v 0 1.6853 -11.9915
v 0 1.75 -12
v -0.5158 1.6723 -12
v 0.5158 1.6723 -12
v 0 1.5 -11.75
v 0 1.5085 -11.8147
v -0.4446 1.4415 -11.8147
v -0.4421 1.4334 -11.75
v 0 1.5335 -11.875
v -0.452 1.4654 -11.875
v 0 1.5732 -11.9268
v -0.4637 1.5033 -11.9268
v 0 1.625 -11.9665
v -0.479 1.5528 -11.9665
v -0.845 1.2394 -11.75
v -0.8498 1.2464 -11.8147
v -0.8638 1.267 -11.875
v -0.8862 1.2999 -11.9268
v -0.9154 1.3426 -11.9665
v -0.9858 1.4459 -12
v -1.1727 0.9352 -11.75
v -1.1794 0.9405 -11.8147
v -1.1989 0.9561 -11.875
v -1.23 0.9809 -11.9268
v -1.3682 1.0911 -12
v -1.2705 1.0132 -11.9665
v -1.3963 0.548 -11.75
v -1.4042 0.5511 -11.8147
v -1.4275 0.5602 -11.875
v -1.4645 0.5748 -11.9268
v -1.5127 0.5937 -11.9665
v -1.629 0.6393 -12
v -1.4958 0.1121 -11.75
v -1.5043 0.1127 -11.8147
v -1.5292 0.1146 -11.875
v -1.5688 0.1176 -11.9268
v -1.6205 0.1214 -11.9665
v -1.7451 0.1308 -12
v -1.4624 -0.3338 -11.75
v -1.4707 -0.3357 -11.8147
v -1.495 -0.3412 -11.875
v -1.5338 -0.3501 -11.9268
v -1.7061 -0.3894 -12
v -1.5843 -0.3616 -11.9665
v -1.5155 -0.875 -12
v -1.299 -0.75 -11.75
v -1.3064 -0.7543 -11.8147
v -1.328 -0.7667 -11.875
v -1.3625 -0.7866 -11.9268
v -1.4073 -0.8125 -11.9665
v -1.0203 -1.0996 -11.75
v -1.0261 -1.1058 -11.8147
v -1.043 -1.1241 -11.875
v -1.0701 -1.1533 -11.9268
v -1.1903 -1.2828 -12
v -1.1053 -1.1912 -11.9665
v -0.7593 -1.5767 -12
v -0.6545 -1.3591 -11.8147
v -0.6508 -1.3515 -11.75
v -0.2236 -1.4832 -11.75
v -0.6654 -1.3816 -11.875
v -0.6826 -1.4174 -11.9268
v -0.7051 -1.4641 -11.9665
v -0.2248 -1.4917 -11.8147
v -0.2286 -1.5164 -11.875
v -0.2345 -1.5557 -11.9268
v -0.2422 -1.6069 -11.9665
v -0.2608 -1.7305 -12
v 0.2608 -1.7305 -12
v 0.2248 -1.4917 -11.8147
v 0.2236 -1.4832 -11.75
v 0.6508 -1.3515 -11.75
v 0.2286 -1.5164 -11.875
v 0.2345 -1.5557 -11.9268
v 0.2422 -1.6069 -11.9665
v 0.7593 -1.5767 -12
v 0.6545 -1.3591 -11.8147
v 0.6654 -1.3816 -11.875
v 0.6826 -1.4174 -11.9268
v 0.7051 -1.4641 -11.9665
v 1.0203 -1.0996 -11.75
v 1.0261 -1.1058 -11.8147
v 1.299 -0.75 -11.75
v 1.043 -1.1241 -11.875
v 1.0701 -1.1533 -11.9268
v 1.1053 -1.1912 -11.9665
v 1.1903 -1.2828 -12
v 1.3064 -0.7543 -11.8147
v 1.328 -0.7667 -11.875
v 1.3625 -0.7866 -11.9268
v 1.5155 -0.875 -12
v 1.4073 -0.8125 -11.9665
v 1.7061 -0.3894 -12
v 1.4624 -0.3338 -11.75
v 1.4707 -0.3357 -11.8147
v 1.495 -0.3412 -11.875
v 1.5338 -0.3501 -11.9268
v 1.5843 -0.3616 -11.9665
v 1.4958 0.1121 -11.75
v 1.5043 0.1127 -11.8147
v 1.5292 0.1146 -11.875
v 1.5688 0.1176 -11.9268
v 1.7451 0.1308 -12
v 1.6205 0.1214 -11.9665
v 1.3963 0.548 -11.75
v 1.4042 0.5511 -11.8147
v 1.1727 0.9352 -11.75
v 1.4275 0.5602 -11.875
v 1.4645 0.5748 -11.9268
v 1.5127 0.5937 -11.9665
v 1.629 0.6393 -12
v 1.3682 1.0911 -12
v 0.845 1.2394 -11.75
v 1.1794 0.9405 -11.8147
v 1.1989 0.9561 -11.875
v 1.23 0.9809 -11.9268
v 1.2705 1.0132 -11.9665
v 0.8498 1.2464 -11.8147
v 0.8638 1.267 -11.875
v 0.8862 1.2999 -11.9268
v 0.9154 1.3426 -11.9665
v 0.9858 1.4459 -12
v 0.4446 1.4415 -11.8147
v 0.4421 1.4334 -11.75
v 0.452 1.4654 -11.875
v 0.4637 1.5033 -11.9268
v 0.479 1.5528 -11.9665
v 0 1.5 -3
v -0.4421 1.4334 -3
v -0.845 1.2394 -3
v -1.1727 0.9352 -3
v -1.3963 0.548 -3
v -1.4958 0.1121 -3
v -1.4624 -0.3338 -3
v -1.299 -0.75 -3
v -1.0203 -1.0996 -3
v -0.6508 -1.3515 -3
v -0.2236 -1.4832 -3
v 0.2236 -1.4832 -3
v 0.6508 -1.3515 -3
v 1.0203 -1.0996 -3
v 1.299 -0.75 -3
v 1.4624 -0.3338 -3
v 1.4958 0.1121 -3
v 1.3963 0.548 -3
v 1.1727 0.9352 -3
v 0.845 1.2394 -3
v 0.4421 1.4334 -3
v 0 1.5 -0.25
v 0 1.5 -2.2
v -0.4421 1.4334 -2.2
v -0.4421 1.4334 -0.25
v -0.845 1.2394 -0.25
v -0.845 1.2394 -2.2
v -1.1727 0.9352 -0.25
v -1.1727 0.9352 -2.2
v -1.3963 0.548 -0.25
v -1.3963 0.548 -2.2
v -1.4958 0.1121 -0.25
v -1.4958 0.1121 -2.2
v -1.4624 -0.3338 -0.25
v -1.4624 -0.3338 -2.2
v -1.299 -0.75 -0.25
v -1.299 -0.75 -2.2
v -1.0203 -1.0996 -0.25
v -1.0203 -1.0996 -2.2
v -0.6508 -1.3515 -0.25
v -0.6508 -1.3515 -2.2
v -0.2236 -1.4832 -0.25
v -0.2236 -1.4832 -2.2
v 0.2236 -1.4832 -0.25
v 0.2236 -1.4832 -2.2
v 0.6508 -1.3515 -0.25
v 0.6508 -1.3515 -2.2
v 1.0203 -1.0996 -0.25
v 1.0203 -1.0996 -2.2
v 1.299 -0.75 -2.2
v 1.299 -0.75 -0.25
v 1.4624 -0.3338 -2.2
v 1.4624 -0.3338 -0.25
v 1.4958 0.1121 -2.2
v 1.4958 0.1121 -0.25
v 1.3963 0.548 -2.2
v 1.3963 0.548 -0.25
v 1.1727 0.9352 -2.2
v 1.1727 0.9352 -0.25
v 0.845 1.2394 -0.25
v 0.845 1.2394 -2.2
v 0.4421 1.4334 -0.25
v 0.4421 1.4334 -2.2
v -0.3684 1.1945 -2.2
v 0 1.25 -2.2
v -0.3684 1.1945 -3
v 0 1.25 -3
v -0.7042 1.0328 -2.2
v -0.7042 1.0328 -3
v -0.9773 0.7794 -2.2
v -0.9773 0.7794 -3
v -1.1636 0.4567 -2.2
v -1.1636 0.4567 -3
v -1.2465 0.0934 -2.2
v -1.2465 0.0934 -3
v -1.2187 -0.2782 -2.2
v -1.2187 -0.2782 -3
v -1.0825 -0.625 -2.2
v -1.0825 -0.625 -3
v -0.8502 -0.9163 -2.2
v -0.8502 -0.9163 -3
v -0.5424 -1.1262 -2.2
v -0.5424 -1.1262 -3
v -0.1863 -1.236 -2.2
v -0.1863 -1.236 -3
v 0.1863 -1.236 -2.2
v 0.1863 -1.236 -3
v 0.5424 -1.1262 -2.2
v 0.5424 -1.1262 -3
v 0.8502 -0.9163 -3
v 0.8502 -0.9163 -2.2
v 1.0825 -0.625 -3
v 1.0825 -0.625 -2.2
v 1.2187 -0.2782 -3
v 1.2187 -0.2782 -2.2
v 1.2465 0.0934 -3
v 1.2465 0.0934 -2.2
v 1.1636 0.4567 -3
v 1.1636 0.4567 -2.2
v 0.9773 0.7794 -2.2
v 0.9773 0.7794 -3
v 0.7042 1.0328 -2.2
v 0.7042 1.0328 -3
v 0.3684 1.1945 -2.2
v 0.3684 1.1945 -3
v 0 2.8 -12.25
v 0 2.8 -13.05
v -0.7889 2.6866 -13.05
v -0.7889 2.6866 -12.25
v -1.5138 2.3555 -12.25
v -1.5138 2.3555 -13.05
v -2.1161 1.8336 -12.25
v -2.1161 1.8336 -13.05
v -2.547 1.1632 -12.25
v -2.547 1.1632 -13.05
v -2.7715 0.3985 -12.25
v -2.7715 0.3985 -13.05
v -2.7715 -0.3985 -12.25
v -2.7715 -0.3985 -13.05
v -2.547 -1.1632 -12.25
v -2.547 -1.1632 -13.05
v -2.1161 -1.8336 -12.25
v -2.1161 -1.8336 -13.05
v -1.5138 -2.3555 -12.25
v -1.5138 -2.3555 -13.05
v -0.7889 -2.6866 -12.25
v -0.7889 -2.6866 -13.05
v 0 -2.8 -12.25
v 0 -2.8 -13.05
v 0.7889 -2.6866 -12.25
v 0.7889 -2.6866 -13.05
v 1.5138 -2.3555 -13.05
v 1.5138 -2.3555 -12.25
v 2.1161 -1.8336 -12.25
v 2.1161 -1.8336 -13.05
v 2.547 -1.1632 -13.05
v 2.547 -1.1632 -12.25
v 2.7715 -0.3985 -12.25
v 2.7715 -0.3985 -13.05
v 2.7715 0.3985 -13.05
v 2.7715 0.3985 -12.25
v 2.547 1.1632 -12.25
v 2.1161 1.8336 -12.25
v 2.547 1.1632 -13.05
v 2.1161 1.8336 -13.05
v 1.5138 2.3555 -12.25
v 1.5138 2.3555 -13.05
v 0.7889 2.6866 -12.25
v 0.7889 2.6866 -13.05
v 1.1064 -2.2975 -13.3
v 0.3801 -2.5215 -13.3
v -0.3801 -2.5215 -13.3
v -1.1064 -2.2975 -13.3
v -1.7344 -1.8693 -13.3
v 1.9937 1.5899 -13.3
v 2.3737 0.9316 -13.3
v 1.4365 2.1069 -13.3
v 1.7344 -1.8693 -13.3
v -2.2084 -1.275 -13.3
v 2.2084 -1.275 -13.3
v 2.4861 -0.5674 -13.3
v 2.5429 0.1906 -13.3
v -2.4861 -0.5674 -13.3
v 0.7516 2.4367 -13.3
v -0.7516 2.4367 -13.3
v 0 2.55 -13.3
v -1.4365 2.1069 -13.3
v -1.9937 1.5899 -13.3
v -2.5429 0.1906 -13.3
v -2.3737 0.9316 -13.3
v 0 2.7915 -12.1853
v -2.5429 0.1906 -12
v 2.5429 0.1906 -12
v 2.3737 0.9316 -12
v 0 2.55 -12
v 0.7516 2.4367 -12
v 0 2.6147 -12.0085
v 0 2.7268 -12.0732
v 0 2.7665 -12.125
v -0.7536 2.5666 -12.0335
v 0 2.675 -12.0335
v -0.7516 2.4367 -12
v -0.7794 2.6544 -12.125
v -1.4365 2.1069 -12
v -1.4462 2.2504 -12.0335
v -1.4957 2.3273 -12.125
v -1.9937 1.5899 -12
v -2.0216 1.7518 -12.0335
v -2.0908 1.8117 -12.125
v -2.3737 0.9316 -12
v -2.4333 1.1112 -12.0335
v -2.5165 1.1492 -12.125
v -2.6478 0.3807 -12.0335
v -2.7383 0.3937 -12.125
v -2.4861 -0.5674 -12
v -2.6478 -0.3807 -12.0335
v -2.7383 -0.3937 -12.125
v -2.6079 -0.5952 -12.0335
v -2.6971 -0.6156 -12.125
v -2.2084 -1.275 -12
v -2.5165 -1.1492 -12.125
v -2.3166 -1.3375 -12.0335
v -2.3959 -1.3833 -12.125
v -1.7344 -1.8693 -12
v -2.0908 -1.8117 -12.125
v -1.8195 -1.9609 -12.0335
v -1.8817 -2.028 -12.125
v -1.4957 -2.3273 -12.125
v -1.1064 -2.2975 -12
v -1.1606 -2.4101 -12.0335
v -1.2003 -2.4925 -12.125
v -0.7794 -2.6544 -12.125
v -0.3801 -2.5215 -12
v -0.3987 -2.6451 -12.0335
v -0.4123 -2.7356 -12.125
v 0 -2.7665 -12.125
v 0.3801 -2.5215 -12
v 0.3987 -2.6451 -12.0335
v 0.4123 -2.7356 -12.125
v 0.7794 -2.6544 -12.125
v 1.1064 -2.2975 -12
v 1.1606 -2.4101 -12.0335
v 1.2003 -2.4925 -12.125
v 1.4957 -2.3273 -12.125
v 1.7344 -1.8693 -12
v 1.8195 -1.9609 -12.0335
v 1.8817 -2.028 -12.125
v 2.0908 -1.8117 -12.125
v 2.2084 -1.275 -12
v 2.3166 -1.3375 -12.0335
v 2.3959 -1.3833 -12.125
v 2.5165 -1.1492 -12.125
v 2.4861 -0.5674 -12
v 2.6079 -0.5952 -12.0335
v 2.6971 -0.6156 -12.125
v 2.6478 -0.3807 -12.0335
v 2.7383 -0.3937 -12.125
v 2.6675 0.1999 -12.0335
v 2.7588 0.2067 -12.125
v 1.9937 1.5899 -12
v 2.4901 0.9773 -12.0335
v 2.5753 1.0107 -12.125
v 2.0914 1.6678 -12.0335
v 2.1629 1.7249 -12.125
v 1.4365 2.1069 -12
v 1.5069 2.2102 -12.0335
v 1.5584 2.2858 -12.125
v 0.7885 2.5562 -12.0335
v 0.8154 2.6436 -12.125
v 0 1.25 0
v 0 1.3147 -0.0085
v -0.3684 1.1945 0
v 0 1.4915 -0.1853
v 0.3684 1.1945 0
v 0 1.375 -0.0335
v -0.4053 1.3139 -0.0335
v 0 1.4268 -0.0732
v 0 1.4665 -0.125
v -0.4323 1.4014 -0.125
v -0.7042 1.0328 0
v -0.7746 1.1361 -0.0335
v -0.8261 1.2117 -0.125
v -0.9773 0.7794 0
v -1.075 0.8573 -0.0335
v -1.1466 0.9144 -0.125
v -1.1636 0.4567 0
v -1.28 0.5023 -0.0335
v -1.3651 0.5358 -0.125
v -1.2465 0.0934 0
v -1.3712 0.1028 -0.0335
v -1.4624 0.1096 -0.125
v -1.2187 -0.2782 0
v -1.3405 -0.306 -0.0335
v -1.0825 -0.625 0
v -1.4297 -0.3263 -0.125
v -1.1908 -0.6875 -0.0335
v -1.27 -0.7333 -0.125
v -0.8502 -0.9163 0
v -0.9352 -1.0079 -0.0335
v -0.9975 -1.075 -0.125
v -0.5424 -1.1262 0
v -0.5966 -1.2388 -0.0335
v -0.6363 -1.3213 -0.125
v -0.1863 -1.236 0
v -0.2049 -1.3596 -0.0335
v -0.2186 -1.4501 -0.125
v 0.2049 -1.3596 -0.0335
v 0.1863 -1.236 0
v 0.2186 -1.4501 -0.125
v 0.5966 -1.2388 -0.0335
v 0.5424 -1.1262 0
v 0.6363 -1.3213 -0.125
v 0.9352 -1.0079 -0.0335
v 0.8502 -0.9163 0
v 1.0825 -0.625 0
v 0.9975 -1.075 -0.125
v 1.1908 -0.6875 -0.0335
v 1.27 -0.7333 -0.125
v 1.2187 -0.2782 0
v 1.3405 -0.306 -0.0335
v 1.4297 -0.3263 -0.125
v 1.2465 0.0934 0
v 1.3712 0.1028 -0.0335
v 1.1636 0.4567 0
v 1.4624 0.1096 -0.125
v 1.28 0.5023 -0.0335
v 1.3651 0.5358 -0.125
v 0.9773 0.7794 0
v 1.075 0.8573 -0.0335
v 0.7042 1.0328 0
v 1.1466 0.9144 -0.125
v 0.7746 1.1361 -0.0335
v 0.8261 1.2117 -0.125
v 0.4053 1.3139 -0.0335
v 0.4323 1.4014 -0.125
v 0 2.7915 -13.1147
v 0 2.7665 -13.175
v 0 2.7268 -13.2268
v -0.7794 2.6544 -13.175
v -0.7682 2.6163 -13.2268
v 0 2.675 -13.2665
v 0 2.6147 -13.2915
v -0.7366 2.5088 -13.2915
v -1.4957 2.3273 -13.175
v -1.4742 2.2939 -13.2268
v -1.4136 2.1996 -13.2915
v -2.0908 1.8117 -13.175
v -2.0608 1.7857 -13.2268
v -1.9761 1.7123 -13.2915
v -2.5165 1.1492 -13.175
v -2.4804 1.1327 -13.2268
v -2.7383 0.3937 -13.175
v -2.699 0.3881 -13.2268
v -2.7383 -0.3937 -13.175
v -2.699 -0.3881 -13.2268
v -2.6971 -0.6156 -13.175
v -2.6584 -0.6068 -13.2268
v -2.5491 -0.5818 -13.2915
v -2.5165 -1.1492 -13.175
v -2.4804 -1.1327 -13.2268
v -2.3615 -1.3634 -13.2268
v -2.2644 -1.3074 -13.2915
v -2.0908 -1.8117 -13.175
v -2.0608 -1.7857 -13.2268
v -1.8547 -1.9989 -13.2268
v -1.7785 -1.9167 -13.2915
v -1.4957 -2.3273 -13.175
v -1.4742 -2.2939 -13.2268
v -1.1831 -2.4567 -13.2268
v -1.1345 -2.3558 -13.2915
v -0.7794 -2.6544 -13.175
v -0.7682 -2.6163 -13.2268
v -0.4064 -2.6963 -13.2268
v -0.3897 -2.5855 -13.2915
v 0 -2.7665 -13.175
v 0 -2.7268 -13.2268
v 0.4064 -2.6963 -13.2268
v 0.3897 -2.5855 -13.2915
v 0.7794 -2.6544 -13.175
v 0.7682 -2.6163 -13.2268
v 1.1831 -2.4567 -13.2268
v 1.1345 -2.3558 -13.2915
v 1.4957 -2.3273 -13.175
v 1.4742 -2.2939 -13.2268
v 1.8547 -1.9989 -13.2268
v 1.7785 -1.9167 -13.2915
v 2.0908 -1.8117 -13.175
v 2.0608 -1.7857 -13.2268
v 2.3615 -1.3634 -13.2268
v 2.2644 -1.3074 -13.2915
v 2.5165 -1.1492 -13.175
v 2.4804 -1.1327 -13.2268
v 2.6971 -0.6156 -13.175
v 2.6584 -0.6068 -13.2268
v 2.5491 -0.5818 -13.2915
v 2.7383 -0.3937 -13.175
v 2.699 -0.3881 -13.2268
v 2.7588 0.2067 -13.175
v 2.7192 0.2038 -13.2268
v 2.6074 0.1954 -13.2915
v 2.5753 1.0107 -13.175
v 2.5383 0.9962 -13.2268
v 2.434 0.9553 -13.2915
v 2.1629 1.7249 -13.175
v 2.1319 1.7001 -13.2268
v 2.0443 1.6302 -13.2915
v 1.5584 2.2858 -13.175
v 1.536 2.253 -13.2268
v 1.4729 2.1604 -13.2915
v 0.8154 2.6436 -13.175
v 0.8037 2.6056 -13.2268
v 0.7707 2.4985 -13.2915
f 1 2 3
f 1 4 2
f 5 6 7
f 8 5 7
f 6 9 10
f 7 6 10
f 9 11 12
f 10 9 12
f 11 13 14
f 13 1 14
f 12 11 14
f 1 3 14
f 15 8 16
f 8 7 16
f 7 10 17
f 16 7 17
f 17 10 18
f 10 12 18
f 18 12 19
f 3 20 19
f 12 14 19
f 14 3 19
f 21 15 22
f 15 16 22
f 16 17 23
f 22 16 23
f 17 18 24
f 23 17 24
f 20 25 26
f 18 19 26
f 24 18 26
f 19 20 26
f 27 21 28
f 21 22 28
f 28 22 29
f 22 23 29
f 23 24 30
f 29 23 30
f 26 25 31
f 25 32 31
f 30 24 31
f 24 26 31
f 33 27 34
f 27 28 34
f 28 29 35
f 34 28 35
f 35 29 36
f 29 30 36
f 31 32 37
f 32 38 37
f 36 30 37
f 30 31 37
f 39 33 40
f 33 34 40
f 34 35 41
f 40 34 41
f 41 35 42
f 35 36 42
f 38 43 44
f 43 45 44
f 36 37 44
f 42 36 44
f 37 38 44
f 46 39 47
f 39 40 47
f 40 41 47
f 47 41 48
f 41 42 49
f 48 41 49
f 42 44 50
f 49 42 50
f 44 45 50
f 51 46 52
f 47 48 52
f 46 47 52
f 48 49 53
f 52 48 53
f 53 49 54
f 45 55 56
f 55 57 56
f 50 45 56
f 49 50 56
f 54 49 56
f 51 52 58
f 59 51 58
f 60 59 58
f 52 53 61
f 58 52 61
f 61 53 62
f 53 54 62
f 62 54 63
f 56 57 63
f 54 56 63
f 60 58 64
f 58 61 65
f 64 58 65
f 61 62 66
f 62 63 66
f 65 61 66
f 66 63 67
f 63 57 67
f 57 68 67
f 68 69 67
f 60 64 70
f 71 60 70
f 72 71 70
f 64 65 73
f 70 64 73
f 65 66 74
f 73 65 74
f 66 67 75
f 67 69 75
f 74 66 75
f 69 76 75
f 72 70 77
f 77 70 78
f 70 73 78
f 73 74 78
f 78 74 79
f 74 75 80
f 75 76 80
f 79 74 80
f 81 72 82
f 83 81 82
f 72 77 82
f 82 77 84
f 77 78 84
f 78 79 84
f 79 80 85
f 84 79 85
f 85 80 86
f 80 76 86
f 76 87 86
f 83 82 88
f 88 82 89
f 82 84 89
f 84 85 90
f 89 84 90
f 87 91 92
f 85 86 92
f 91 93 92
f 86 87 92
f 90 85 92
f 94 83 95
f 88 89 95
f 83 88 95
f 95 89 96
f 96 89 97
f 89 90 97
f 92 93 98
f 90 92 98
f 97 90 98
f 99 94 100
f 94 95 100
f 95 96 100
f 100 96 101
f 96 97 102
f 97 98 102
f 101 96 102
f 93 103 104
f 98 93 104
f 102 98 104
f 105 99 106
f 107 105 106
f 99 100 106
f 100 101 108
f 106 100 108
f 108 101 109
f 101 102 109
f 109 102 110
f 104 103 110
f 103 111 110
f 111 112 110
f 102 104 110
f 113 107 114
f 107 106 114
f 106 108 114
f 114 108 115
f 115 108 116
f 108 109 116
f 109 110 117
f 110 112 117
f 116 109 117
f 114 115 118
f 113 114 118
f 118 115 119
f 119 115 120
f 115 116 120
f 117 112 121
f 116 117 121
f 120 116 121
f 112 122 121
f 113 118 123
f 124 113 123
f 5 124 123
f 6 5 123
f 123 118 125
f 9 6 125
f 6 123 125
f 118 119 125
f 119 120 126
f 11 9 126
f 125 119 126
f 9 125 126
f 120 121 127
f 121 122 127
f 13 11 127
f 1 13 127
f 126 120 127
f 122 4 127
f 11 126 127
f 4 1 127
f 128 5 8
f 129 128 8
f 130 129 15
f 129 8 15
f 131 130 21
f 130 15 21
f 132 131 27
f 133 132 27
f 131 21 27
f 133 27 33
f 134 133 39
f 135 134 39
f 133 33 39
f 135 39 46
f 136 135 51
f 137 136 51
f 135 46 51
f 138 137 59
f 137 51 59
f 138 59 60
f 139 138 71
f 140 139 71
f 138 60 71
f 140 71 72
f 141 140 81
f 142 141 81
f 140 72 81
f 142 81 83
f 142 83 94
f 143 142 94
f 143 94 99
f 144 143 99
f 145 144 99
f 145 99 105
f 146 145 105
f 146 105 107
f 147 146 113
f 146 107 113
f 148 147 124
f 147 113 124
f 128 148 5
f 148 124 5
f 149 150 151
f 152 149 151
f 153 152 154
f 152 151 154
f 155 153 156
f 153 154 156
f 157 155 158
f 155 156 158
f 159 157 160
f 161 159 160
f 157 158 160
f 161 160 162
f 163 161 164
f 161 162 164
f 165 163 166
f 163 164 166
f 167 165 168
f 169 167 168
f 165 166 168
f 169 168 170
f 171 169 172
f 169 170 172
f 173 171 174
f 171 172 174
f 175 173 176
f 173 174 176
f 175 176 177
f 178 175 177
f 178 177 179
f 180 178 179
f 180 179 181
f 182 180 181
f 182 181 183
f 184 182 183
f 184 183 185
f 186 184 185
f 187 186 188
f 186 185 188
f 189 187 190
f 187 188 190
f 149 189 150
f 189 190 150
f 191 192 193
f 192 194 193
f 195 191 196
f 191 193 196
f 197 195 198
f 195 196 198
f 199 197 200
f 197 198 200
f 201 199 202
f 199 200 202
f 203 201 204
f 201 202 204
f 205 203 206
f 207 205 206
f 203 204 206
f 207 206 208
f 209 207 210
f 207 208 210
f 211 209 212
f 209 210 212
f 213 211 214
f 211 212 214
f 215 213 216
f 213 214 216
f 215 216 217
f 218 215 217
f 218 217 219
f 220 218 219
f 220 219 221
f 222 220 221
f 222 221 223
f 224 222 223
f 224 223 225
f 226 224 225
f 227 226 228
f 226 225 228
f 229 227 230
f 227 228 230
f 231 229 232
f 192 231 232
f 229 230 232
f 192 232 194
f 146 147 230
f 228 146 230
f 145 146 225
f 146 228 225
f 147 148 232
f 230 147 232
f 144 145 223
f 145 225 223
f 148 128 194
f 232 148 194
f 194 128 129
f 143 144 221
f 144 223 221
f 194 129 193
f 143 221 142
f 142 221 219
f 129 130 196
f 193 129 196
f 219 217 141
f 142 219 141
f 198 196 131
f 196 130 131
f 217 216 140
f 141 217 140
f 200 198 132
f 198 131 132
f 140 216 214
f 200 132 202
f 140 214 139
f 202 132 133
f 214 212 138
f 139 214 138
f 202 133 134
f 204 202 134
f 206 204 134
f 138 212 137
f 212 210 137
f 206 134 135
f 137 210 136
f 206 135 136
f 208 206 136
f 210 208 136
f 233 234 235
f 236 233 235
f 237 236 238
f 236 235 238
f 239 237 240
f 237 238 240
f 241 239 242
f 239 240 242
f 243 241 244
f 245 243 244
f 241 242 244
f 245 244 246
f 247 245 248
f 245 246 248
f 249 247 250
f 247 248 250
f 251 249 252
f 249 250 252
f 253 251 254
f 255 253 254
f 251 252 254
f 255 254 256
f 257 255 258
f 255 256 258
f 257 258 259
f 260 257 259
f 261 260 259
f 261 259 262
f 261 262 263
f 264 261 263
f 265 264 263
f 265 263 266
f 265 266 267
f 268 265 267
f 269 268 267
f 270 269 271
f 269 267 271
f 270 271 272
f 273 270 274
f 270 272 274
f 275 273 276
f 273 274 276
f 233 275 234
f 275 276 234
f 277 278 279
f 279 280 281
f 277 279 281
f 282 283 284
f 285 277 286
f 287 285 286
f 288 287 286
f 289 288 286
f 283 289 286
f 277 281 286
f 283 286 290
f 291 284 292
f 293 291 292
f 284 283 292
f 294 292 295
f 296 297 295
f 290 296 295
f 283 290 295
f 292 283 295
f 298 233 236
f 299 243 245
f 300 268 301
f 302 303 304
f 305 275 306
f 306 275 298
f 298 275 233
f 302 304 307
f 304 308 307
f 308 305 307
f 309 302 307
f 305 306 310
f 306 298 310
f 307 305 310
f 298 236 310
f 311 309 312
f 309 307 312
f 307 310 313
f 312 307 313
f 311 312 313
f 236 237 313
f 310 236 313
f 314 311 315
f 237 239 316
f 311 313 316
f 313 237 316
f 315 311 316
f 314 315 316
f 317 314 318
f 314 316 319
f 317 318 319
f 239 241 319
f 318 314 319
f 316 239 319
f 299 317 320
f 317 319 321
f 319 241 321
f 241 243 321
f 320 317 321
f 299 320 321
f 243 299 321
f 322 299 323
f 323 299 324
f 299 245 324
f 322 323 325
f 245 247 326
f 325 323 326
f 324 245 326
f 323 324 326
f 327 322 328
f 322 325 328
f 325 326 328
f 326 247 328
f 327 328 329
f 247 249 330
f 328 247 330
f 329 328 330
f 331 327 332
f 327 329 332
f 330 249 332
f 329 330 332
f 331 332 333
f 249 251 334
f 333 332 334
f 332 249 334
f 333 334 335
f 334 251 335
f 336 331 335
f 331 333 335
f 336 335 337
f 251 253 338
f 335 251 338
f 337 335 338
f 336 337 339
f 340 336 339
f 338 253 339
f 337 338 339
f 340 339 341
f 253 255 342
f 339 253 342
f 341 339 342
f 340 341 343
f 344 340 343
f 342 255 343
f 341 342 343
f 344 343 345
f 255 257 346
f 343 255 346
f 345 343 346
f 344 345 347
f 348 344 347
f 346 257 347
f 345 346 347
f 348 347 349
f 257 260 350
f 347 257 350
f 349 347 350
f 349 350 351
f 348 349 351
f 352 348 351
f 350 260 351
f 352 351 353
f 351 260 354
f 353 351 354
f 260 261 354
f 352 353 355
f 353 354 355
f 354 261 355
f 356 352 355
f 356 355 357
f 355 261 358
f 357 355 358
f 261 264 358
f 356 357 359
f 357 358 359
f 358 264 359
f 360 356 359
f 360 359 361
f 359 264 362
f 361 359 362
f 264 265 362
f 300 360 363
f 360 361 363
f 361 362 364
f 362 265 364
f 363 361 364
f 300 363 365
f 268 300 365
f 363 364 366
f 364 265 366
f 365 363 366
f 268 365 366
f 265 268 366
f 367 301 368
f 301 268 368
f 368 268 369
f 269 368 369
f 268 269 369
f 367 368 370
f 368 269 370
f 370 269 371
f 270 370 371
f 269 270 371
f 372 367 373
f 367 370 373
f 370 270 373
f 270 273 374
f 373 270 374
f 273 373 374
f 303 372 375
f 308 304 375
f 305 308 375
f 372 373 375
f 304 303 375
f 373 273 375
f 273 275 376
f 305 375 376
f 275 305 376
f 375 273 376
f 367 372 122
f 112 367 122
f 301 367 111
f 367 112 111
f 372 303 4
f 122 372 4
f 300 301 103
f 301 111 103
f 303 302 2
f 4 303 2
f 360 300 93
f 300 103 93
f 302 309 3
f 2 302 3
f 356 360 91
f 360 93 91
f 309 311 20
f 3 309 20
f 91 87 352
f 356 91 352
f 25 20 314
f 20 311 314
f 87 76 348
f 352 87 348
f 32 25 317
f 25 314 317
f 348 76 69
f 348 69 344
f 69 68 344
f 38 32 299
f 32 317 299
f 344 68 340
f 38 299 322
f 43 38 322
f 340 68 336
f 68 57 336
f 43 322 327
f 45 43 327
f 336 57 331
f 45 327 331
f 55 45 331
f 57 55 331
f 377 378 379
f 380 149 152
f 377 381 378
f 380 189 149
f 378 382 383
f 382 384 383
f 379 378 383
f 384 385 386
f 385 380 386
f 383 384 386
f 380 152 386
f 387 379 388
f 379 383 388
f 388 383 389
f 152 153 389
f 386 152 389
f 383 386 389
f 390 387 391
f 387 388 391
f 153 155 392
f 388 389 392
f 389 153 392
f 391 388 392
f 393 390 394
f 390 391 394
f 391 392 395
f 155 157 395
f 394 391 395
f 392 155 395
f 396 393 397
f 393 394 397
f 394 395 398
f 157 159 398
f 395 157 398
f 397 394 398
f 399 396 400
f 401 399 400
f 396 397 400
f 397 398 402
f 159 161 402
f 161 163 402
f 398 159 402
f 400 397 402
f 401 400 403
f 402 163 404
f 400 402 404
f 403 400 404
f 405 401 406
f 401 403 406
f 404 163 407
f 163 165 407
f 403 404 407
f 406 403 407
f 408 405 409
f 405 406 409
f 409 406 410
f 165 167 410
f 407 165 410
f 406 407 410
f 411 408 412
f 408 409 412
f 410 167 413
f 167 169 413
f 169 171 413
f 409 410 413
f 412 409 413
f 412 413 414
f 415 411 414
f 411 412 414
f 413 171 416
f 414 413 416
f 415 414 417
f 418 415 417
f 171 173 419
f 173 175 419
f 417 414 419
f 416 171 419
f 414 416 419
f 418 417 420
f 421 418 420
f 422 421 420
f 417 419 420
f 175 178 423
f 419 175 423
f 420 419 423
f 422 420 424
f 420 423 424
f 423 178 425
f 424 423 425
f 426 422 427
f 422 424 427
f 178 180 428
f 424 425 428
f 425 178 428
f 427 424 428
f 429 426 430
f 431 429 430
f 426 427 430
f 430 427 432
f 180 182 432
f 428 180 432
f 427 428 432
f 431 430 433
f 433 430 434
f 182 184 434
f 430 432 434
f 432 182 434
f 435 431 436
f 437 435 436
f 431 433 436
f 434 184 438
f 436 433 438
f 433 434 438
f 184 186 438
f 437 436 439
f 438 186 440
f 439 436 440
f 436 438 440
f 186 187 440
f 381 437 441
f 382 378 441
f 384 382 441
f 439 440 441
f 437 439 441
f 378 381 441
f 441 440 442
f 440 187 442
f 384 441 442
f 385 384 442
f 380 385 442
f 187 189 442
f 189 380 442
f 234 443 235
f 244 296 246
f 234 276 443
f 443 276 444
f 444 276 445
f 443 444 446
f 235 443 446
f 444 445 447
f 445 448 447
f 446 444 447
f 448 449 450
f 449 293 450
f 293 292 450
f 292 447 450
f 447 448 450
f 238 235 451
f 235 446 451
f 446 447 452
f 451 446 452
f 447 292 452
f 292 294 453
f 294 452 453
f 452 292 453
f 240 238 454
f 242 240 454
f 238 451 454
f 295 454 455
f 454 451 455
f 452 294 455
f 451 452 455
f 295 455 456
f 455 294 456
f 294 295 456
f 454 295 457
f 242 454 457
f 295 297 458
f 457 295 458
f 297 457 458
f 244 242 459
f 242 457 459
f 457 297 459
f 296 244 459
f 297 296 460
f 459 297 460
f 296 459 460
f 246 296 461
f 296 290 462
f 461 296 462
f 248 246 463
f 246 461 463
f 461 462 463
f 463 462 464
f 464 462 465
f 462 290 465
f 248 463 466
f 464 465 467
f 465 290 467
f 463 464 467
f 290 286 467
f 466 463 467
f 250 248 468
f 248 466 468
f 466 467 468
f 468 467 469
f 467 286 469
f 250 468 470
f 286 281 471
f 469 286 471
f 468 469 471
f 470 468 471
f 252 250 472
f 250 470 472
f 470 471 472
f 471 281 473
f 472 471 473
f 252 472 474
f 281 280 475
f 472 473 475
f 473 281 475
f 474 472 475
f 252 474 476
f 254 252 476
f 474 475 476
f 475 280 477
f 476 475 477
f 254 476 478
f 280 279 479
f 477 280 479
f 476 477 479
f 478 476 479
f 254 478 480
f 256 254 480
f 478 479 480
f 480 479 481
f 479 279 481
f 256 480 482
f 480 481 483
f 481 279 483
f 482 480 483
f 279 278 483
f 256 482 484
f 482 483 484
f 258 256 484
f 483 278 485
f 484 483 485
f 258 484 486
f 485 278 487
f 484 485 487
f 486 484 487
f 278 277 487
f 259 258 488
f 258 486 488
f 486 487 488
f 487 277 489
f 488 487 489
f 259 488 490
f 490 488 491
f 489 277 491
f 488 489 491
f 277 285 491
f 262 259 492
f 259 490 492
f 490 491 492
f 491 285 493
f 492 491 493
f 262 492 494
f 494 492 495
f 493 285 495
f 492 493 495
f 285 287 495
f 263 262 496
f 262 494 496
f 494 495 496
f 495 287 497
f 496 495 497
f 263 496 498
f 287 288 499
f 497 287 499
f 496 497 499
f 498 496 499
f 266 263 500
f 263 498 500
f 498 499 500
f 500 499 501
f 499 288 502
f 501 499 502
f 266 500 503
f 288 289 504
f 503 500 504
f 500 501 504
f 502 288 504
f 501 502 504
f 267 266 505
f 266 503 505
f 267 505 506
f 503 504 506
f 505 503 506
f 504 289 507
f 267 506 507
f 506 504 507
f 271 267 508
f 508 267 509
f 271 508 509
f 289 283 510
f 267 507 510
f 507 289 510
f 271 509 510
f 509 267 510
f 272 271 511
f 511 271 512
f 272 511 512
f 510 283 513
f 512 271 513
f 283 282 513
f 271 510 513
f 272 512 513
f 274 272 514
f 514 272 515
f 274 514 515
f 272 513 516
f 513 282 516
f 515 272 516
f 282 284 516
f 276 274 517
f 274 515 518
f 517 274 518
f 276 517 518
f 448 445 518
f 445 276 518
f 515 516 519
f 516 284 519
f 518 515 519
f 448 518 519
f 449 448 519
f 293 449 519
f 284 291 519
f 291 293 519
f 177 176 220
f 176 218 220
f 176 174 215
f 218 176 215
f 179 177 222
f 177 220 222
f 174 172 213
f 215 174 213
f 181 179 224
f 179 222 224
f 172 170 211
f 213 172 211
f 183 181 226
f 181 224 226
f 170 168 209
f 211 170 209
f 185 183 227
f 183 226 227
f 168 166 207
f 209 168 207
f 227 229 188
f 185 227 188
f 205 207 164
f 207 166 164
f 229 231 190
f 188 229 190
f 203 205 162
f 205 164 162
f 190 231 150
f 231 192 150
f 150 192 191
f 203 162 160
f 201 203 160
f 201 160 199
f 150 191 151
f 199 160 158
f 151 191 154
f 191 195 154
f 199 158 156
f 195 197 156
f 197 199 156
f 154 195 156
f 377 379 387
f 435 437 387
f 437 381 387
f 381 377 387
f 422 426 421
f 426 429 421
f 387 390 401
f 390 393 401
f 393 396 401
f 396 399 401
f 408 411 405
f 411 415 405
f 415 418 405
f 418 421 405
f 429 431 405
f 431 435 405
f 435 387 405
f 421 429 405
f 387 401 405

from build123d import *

# Parameters (mm, degrees)
FILLET_1_R = 0.25


with BuildPart() as part:
    # 草图1 → 旋转1 (revolve)
    with BuildSketch(Plane.YZ, mode=Mode.PRIVATE) as revolve_1_sk:
        Polygon((0, 0), (-1.5, 0), (-1.5, -2.2), (-1.25, -2.2), (-1.25, -3), (-1.5, -3), (-1.5, -12), (-2.8, -12), (-2.8, -13.3), (0, -13.3), align=None)
    revolve(revolve_1_sk.sketch.rotate(Axis((0, 0, -13.3), (0, 0, 1)), 180), axis=Axis((0, 0, -13.3), (0, 0, 1)))

    # 圆角1
    fillet_1_edges = [part.edges().sort_by_distance(p)[0] for p in [
        (0, -1.5, 0),
        (0, -2.8, -13.3),
        (0, -2.8, -12),
        (0, -1.5, -12),
    ]]
    fillet(fillet_1_edges, radius=FILLET_1_R)


solid = part.part
